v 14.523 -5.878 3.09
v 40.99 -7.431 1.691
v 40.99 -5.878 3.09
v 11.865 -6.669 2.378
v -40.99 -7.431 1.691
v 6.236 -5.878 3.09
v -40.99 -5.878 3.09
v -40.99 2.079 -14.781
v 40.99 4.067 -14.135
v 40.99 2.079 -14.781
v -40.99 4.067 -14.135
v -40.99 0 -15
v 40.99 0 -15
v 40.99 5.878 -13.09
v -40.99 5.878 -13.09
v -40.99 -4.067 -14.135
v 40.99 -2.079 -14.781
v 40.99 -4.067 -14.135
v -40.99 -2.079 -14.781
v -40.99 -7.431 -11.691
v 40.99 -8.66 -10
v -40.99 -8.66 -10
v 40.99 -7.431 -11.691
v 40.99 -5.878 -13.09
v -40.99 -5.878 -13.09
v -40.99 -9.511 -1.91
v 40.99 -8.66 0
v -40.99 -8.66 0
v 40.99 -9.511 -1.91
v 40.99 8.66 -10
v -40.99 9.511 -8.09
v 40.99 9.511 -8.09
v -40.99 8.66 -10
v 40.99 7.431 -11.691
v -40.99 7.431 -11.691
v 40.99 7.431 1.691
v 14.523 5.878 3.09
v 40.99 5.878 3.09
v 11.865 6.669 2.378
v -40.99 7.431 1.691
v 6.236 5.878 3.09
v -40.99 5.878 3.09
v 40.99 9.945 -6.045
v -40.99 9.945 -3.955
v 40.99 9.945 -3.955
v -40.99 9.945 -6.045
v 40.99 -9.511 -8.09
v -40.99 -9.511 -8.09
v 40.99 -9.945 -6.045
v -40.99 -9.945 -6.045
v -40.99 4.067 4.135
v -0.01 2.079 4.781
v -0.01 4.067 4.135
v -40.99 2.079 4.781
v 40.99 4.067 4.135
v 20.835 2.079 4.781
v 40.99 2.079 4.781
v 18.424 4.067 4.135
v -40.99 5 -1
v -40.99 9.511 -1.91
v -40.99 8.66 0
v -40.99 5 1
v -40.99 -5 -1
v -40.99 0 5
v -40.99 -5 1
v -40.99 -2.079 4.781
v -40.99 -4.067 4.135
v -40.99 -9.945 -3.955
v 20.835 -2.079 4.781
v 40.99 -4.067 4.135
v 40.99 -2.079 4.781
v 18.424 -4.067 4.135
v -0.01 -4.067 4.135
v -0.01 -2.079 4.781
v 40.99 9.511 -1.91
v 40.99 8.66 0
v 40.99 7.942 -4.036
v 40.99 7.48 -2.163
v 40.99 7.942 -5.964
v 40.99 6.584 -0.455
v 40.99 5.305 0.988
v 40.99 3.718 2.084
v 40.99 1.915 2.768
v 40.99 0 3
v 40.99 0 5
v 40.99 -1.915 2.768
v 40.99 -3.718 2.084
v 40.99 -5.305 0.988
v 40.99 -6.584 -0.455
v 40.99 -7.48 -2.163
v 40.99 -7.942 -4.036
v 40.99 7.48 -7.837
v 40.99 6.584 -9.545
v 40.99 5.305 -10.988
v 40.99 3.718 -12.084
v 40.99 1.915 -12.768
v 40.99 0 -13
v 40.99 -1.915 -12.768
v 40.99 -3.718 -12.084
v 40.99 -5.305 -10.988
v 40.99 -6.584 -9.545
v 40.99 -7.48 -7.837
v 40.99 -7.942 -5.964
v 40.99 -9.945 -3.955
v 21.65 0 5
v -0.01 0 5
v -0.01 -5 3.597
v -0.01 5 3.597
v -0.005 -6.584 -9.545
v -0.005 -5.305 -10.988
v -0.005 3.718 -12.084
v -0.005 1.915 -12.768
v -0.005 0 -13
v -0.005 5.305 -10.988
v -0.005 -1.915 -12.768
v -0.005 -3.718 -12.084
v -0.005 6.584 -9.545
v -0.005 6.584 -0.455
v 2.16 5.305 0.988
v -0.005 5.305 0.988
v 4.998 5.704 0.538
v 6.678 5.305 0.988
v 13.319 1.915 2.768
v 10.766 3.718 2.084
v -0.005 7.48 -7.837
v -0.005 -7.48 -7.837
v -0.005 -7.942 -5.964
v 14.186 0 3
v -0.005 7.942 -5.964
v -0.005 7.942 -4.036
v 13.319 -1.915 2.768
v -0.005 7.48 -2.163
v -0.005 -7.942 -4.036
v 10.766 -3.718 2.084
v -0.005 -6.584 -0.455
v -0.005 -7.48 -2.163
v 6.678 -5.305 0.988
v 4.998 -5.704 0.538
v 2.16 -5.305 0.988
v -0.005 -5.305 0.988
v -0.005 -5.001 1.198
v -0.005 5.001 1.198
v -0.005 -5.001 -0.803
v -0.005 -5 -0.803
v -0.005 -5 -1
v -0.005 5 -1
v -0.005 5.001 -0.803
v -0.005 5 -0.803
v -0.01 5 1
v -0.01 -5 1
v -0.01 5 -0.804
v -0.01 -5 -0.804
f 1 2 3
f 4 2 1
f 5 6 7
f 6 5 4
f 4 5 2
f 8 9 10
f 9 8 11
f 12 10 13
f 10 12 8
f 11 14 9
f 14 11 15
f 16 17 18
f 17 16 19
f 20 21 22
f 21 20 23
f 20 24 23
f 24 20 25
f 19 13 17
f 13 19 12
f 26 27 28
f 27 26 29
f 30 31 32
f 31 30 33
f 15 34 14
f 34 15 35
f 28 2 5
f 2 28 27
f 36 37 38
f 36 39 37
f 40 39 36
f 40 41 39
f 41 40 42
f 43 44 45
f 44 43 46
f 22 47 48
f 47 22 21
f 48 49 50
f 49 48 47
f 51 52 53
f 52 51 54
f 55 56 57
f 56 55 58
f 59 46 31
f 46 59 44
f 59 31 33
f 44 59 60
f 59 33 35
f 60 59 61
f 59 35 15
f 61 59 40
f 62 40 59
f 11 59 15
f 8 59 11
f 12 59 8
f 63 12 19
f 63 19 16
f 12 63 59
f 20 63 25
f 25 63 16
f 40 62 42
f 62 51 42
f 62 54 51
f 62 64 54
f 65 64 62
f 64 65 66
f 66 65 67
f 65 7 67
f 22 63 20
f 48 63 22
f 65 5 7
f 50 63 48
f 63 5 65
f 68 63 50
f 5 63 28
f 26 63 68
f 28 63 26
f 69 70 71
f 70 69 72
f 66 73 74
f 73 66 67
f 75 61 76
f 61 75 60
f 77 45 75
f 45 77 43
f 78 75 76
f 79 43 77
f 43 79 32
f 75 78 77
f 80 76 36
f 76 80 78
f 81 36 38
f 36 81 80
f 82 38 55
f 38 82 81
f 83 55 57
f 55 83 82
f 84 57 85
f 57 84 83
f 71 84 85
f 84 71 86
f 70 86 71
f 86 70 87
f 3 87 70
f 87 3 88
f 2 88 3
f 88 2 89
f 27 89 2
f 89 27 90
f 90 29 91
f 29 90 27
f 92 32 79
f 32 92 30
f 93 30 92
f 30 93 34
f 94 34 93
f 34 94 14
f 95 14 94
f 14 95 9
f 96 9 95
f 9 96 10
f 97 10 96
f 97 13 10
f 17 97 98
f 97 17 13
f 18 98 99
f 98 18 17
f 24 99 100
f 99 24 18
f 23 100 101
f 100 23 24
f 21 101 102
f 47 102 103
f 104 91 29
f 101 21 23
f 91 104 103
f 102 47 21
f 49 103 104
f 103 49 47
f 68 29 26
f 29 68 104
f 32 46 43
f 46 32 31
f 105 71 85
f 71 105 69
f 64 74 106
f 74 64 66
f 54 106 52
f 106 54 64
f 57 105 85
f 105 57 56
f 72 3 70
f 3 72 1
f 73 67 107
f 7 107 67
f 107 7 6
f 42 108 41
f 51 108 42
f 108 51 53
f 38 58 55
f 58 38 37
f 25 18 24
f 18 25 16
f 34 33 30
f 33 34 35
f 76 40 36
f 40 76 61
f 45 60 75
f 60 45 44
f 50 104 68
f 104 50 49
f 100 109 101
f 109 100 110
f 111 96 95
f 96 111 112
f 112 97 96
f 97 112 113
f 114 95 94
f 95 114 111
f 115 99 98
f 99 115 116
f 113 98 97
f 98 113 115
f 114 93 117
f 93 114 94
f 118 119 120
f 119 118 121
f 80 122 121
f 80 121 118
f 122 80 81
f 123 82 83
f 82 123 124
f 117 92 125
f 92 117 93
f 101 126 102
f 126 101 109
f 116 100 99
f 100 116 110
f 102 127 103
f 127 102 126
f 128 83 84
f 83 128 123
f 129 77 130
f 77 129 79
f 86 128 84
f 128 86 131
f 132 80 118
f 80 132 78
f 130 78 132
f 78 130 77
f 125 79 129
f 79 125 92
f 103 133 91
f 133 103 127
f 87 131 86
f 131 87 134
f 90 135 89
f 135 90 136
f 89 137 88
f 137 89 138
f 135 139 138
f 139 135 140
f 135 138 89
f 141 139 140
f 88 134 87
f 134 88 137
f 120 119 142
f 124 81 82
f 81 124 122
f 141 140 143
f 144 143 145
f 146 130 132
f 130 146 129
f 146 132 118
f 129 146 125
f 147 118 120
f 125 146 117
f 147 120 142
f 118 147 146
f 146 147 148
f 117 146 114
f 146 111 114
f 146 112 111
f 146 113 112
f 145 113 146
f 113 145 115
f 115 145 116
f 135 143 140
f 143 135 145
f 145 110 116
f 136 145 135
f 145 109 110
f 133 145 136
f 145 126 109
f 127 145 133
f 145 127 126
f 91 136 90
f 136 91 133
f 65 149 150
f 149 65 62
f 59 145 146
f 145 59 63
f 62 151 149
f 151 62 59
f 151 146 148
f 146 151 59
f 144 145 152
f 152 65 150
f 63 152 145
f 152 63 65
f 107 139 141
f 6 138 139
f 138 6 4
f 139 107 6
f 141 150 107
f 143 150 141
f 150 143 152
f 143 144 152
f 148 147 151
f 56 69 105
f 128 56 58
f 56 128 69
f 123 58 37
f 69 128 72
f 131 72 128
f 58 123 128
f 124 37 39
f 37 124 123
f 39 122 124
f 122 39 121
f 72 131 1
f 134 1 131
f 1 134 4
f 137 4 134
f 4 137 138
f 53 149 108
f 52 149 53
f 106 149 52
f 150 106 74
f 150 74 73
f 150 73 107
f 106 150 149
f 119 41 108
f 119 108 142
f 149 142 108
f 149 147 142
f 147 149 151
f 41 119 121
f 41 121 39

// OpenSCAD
E = 0.01;

WIND_LENGTH = 41;
WIND_WIDTH = 10;
WIND_HEIGHT = 2;
GAP_LENGTH = 3;

EXIT_ANGLE = 15;
EXIT_FLARE = 8;

module whistle(length=WIND_LENGTH,
              width=WIND_WIDTH,
              height=WIND_HEIGHT,
              gap=GAP_LENGTH,
              a=EXIT_ANGLE,
              b=EXIT_FLARE) {
        difference() {
            translate([0, 0, -width / 2])
                rotate(a=90, v=[0, 1, 0])
                    difference() {
                        cylinder(r=width, h=(length - E) * 2, center=true);
                            translate([0, 0, length / 2])
                                 cylinder(r=width - 2, h=length + E, center=true);
                    }
            fipple(length, width, height, gap, a, b);
    }
}

module fipple(length=WIND_LENGTH,
              width=WIND_WIDTH,
              height=WIND_HEIGHT,
              gap=GAP_LENGTH,
              a=EXIT_ANGLE,
              b=EXIT_FLARE) {
    translate([-length / 2, 0 , 0])
        cube([length, width, height], center=true);
    translate([length / 4, 0, -height])
        cube([length / 2, width, 2 * height], center=true);
    translate([-E, 0, -tan(EXIT_ANGLE) * GAP_LENGTH])
        cut(width, length, height * 10, a, b);
}

module cut(width, length, height, a, b) {
    x1 = length;
    z1 = length * tan(a);
    y1 = width / 2;
    y2 = width / 2 + length * tan(b);
    polyhedron(
        points=[
            [0, -y1, 0], [x1, -y2, z1], [0, -y1, z1],
            [0, y1, 0],  [x1, y2, z1],  [0, y1, z1]
        ],
        triangles=[
            [0, 2, 1], [3, 4, 5],
            [0, 5, 2], [0, 3, 5],
            [2, 4, 1], [2, 5, 4],
            [0, 4, 3], [0, 1, 4]
        ]);
}

whistle();
